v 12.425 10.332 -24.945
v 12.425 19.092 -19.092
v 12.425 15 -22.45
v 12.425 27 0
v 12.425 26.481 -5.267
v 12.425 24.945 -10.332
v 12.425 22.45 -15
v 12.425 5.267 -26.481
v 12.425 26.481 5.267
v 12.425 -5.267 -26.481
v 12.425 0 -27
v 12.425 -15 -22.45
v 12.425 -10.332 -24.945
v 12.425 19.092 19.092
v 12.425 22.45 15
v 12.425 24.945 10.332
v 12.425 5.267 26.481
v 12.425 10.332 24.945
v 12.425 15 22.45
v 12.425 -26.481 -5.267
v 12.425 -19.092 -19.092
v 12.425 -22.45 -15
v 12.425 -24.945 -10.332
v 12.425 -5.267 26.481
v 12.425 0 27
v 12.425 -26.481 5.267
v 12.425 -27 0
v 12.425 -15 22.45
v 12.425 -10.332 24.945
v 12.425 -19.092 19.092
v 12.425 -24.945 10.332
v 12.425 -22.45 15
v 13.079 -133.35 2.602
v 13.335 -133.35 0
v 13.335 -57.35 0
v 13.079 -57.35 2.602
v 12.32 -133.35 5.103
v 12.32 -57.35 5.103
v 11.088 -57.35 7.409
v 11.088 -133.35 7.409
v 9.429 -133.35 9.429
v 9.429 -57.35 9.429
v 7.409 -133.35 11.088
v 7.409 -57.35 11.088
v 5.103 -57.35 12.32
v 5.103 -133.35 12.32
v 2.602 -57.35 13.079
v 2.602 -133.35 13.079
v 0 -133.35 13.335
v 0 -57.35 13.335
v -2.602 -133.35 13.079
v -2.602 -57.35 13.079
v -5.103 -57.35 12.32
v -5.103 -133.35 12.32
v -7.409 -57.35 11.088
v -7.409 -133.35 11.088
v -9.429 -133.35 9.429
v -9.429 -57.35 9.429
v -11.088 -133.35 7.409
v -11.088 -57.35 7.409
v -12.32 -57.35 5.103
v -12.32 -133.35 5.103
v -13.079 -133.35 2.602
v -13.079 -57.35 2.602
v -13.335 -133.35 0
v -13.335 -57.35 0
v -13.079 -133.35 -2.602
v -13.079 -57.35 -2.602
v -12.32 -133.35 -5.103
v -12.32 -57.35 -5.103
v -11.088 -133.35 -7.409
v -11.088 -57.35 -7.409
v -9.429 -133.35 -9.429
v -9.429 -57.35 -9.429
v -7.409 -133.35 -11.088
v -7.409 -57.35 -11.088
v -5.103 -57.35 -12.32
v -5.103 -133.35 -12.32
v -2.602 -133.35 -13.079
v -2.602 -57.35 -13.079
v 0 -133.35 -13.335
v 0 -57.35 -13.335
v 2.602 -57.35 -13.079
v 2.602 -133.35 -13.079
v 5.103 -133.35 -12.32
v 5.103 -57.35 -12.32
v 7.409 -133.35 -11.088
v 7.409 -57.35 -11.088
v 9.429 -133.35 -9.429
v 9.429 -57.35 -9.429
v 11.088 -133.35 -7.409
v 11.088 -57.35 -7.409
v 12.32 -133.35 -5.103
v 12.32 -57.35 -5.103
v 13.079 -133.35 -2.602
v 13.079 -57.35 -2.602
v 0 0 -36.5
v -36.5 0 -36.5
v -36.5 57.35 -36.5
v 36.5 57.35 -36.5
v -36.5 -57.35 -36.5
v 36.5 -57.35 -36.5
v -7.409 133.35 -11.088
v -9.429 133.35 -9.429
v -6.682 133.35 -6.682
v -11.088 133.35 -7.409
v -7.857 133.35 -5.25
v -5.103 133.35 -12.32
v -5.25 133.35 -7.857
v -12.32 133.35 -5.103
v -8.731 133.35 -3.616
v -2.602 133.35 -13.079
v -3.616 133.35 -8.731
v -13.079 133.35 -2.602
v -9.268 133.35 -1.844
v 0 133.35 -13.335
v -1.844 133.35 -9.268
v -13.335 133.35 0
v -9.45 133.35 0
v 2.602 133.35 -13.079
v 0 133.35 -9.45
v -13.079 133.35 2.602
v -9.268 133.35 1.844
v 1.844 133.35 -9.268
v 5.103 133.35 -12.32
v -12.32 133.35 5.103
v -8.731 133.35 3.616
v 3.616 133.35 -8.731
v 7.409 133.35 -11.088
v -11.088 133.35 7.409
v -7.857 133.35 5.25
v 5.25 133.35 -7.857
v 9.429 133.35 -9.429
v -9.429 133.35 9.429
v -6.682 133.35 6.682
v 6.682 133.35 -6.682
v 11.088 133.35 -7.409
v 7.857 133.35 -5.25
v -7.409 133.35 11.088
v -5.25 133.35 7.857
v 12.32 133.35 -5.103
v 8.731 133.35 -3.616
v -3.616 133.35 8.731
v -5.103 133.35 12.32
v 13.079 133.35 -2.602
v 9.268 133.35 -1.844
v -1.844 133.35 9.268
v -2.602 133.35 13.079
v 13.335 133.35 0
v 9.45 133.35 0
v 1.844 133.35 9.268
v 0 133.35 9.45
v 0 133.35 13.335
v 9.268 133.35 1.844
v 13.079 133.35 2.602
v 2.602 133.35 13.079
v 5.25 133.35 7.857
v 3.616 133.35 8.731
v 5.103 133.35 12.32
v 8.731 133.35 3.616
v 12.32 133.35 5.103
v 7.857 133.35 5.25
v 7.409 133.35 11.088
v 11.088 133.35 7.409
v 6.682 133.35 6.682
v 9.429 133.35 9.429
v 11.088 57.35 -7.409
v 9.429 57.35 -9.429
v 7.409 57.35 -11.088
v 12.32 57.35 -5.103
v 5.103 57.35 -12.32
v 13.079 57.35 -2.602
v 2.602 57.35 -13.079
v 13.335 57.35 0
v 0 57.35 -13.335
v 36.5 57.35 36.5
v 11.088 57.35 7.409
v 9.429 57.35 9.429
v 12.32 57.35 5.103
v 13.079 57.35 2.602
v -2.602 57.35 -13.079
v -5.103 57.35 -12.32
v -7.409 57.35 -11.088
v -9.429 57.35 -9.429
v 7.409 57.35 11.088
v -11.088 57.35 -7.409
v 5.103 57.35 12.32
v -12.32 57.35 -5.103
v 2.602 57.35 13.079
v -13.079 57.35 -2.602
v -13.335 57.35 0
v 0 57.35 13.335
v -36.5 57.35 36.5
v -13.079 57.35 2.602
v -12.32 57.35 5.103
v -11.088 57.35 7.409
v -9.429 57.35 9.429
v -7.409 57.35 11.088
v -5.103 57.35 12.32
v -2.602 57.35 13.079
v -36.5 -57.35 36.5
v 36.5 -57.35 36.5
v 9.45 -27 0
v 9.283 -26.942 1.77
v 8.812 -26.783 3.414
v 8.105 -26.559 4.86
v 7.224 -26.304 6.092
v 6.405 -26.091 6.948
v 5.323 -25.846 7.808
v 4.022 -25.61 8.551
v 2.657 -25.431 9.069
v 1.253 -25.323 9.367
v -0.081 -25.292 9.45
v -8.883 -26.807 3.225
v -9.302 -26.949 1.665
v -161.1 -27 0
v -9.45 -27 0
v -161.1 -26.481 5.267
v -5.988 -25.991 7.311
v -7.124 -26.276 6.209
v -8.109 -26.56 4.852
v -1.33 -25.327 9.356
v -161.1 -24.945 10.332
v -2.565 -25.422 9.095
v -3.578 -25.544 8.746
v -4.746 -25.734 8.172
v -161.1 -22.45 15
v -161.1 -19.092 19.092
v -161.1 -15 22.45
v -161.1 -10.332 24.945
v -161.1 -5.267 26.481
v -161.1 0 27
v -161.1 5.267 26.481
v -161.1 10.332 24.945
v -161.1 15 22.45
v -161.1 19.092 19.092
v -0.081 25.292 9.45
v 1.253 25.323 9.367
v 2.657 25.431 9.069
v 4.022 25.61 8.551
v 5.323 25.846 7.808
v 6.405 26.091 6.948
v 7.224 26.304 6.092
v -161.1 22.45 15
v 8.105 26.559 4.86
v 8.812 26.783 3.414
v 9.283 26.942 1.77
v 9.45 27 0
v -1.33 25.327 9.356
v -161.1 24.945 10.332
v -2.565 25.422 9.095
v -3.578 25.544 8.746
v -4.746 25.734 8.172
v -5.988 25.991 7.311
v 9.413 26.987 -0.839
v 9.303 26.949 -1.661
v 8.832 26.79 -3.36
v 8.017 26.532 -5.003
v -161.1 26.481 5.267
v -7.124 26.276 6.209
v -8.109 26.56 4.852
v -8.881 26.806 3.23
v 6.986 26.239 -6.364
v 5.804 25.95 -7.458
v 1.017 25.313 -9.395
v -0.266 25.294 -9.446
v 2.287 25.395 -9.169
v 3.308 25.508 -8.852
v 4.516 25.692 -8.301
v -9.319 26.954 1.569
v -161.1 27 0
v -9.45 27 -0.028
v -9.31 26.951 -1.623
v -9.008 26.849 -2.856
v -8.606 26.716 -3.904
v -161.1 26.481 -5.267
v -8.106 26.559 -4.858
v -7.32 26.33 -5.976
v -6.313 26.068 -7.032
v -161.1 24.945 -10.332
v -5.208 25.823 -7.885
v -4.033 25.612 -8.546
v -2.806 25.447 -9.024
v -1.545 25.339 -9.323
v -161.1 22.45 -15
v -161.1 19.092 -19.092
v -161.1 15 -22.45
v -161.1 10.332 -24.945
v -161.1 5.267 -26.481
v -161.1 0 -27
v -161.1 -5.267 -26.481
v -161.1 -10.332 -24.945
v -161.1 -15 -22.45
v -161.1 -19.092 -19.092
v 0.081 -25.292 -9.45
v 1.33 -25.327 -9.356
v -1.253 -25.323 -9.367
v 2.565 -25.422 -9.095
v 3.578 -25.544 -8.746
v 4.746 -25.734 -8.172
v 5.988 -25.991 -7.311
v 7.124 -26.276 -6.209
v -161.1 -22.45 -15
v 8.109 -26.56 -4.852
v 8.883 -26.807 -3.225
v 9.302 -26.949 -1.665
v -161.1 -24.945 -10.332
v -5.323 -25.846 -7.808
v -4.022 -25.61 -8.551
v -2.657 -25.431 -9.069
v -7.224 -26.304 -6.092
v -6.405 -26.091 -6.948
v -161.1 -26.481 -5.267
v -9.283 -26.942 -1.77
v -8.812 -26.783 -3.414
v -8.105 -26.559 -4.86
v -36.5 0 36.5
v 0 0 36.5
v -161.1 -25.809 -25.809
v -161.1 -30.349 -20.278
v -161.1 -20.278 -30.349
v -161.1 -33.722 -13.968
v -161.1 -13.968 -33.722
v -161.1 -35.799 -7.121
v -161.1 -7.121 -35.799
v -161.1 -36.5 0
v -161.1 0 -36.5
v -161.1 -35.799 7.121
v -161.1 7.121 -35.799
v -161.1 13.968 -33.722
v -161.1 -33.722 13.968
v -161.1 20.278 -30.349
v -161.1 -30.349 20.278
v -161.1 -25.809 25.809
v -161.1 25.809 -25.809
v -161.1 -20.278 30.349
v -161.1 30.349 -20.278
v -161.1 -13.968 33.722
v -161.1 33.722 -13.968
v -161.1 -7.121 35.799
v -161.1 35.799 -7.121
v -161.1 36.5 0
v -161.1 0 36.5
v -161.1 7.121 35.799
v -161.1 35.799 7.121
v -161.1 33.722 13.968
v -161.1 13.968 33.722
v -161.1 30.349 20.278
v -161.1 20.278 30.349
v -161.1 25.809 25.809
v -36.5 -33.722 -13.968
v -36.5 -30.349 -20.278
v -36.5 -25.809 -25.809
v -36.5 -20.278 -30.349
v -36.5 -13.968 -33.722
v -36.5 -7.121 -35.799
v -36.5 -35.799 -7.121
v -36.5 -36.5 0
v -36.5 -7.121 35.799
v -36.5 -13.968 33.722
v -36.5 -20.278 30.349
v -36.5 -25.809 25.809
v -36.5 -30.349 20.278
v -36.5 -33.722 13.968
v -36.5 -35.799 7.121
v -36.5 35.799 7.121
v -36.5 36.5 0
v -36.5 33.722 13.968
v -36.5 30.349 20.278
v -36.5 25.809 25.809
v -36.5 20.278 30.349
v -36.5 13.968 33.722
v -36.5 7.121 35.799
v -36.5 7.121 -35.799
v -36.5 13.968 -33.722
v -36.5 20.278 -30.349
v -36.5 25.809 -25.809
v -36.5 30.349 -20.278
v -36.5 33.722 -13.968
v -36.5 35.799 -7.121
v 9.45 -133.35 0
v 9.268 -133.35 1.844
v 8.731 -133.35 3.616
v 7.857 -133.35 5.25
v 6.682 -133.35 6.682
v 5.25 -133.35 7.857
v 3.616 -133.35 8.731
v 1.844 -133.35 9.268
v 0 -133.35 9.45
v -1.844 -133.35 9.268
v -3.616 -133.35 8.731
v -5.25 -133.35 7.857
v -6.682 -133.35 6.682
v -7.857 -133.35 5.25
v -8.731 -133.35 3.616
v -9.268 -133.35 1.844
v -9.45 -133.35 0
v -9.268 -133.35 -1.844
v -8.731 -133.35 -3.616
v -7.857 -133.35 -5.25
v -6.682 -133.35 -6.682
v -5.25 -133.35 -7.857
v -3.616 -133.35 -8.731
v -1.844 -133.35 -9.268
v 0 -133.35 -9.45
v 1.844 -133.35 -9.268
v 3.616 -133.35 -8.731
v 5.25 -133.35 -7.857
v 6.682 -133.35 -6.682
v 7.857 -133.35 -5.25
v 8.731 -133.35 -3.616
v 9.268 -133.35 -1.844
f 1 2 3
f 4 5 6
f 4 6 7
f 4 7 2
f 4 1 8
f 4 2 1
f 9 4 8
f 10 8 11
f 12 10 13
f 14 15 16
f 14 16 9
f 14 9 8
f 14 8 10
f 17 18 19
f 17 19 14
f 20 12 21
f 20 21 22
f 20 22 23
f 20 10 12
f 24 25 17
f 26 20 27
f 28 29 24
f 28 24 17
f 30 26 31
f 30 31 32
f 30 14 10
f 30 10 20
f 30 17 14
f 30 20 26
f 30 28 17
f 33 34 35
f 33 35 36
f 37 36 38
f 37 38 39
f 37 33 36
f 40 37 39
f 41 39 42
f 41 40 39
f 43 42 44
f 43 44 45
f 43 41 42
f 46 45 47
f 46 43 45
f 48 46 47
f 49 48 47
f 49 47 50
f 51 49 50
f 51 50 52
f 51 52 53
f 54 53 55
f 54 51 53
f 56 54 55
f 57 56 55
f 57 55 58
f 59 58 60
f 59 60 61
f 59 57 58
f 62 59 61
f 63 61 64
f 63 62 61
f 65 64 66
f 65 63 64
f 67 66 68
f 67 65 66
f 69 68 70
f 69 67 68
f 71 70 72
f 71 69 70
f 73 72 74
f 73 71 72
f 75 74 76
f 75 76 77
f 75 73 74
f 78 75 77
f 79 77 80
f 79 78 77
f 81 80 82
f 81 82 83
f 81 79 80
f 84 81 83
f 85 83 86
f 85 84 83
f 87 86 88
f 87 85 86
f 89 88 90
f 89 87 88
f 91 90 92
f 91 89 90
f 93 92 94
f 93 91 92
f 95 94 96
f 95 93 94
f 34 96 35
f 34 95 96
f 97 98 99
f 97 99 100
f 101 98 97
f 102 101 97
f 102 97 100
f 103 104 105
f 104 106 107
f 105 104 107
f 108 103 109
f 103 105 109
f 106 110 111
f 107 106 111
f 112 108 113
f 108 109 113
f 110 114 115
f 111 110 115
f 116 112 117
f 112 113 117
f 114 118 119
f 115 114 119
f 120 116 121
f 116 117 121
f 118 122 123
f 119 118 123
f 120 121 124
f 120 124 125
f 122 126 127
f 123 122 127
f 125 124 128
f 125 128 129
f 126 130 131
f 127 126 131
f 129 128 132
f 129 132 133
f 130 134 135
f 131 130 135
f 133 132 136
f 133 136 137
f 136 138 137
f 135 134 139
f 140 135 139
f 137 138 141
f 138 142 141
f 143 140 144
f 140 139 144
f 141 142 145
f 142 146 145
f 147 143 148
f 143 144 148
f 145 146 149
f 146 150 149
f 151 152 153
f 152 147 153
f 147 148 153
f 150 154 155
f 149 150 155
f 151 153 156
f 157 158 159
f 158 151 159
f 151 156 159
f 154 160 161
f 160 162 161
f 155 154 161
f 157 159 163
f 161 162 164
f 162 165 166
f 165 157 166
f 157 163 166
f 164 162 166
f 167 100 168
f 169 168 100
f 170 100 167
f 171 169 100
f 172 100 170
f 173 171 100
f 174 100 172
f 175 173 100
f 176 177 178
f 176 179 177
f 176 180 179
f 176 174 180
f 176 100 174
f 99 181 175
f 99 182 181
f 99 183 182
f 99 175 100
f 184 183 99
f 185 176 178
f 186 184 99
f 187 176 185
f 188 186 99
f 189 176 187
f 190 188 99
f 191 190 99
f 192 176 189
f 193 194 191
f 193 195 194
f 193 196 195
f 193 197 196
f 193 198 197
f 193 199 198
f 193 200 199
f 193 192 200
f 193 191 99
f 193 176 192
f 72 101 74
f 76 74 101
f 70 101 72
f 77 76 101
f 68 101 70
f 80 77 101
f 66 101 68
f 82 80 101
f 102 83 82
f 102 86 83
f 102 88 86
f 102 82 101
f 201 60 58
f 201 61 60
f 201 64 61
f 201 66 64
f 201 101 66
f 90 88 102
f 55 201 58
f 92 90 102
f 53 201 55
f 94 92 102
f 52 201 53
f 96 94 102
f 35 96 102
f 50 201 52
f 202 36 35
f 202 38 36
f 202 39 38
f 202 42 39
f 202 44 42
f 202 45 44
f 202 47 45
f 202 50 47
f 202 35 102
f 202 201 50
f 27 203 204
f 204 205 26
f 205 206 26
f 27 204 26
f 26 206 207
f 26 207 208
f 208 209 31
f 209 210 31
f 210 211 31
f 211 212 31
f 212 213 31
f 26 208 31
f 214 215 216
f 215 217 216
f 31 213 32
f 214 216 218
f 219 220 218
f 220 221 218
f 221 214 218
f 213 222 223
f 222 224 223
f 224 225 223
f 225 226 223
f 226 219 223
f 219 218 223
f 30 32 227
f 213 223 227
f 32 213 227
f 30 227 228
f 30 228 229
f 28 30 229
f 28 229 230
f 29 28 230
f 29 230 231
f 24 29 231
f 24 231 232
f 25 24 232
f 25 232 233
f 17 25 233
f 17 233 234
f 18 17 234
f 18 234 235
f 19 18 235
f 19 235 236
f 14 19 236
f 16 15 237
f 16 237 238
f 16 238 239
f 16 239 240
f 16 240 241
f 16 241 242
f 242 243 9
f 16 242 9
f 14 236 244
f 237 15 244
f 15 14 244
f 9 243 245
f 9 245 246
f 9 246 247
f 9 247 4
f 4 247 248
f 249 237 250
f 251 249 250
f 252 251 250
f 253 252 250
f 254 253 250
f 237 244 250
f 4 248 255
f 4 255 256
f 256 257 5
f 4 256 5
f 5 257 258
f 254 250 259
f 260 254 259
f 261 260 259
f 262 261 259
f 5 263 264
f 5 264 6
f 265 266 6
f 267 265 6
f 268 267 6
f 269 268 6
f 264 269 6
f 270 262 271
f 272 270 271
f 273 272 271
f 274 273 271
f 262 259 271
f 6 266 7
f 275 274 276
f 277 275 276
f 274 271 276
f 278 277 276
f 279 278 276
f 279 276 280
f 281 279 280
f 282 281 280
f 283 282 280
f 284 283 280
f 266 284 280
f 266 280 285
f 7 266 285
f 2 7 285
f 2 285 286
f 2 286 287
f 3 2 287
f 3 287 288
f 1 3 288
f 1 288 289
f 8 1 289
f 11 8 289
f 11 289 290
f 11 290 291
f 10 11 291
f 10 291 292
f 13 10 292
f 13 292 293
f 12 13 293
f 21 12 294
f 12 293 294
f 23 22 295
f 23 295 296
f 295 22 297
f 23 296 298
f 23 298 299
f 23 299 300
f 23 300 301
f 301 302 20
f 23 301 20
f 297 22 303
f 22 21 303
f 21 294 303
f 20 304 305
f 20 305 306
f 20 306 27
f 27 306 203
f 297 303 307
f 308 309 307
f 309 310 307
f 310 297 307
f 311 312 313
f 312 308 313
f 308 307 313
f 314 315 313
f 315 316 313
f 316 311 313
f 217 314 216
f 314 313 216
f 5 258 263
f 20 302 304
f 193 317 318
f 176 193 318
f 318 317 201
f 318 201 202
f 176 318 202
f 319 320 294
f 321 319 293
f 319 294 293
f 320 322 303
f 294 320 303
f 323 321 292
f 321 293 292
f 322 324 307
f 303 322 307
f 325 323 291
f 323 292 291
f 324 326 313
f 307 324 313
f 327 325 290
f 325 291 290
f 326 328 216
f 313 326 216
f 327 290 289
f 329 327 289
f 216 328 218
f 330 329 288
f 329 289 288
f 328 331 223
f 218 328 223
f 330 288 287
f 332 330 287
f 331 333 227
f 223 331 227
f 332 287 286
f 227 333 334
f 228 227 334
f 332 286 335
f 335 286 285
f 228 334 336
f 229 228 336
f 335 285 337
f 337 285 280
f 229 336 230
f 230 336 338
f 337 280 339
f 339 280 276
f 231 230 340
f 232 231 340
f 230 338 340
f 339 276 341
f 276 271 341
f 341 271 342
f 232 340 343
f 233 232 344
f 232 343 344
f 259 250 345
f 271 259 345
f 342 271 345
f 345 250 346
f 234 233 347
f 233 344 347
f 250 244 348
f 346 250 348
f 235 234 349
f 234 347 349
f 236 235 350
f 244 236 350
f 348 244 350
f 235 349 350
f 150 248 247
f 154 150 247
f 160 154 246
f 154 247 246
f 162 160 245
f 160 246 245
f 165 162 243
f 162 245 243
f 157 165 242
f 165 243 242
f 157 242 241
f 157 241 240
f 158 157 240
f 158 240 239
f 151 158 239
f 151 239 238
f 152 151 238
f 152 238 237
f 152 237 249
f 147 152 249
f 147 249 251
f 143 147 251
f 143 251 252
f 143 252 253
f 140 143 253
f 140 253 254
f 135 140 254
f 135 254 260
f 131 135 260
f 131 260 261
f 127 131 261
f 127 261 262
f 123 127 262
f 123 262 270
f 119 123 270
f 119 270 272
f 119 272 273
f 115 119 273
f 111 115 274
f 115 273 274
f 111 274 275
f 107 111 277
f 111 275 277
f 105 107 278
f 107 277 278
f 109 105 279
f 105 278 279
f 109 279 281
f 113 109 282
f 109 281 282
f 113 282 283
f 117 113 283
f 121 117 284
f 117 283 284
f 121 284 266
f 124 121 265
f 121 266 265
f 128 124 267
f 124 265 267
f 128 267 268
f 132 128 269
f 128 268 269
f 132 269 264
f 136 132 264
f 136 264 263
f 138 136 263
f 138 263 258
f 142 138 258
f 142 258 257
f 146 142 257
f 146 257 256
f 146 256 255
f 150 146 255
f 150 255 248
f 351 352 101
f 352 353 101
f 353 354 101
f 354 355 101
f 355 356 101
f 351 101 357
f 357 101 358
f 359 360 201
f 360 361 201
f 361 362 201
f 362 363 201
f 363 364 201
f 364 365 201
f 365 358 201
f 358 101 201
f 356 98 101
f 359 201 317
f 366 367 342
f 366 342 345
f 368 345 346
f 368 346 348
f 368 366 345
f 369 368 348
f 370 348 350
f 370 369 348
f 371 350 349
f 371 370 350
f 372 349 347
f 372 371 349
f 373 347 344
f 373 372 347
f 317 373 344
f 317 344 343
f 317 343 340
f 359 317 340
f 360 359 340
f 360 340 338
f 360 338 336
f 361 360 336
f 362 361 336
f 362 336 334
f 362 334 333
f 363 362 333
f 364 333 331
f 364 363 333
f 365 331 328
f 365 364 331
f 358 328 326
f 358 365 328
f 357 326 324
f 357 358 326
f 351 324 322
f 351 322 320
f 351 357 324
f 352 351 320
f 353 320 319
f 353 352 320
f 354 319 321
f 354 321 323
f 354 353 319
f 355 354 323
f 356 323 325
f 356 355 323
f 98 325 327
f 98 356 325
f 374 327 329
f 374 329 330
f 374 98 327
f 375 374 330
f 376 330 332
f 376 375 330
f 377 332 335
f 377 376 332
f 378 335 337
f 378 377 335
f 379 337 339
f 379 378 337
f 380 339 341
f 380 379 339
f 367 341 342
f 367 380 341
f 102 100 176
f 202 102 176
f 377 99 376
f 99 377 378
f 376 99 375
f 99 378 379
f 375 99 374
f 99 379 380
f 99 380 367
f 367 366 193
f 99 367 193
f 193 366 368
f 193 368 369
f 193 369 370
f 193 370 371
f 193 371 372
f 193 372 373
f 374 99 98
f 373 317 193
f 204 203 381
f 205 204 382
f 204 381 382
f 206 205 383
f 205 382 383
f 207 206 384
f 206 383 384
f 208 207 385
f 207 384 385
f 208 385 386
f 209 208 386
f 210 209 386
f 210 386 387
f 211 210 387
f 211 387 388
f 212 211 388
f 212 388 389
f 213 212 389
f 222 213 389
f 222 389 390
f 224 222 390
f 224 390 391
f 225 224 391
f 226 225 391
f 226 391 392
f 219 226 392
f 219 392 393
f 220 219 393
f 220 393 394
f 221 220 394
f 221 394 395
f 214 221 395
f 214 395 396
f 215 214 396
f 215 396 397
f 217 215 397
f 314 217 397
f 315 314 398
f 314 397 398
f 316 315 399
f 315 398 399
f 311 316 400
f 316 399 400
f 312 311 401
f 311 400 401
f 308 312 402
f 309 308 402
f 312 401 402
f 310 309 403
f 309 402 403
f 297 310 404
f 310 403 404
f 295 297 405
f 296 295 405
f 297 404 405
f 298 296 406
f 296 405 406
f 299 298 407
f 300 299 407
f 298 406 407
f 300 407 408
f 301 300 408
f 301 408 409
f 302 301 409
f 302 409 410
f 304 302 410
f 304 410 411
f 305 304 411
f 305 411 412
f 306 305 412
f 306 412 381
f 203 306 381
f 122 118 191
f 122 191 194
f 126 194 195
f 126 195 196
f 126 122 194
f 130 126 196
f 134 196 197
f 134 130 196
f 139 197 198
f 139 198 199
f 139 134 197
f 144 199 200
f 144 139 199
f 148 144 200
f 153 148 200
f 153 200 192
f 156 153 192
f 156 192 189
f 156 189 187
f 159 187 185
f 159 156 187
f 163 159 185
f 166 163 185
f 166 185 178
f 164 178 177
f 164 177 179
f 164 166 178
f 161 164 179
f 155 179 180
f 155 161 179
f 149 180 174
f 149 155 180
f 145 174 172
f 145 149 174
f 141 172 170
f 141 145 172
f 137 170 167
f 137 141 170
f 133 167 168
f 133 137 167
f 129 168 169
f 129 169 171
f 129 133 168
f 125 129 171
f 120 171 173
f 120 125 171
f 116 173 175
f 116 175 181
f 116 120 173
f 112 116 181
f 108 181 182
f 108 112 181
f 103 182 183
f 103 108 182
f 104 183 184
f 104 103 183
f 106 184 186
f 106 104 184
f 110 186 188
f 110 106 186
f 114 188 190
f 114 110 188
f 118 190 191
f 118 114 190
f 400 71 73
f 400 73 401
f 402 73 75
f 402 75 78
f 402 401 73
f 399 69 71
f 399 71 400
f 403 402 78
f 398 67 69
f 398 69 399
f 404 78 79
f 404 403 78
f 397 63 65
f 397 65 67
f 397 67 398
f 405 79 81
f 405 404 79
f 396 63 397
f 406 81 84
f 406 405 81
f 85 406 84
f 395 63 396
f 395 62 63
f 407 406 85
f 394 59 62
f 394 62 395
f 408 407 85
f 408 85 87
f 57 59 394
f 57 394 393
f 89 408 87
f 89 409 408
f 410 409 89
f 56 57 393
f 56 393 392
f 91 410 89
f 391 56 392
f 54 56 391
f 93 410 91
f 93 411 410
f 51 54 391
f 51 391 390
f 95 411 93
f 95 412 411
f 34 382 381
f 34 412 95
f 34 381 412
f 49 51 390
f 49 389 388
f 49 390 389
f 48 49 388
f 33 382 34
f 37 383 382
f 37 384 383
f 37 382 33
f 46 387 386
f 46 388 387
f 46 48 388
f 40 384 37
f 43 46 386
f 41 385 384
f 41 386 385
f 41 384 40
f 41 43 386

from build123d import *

# Parameters (mm, degrees)
F0_W      = 73
F0_H      = 73
F1_DEPTH  = 133.35
F2_R      = 36.5
F3_DEPTH  = 161.1
F4_R      = 27
F5_DEPTH  = 173.525
F6_R      = 9.45
F7_DEPTH  = 336
F8_R      = 57.112961
F8_R_2    = 13.335
F9_DEPTH  = 76
F10_R     = 82.497851
F10_R_2   = 13.335
F11_DEPTH = 76


with BuildPart() as f1:
    # F0 (on Front) → F1 (new body, symmetric)
    with BuildSketch(Plane.XZ):
        Rectangle(F0_W, F0_H)
    extrude(amount=F1_DEPTH, both=True)

    # F2 (on Right) → F3 (join)
    with BuildSketch(Plane.YZ):
        Circle(F2_R)
    extrude(amount=-F3_DEPTH)

    # F4 (on face) → F5 (cut)
    with BuildSketch(Plane(origin=(-161.1, 0, 0), x_dir=(0, -1, 0), z_dir=(-1, 0, 0))):
        Circle(F4_R)
    extrude(amount=-F5_DEPTH, mode=Mode.SUBTRACT)

    # F6 (on face) → F7 (cut)
    with BuildSketch(Plane.XZ.offset(133.35)):
        Circle(F6_R)
    extrude(amount=-F7_DEPTH, mode=Mode.SUBTRACT)

    # F8 (on face) → F9 (cut)
    with BuildSketch(Plane(origin=(0, 133.35, 0), x_dir=(-1, 0, 0), z_dir=(0, 1, 0))):
        Circle(F8_R)
        Circle(F8_R_2, mode=Mode.SUBTRACT)
    extrude(amount=-F9_DEPTH, mode=Mode.SUBTRACT)

    # F10 (on face) → F11 (cut)
    with BuildSketch(Plane.XZ.offset(133.35)):
        Circle(F10_R)
        Circle(F10_R_2, mode=Mode.SUBTRACT)
    extrude(amount=-F11_DEPTH, mode=Mode.SUBTRACT)


solid = f1.part
